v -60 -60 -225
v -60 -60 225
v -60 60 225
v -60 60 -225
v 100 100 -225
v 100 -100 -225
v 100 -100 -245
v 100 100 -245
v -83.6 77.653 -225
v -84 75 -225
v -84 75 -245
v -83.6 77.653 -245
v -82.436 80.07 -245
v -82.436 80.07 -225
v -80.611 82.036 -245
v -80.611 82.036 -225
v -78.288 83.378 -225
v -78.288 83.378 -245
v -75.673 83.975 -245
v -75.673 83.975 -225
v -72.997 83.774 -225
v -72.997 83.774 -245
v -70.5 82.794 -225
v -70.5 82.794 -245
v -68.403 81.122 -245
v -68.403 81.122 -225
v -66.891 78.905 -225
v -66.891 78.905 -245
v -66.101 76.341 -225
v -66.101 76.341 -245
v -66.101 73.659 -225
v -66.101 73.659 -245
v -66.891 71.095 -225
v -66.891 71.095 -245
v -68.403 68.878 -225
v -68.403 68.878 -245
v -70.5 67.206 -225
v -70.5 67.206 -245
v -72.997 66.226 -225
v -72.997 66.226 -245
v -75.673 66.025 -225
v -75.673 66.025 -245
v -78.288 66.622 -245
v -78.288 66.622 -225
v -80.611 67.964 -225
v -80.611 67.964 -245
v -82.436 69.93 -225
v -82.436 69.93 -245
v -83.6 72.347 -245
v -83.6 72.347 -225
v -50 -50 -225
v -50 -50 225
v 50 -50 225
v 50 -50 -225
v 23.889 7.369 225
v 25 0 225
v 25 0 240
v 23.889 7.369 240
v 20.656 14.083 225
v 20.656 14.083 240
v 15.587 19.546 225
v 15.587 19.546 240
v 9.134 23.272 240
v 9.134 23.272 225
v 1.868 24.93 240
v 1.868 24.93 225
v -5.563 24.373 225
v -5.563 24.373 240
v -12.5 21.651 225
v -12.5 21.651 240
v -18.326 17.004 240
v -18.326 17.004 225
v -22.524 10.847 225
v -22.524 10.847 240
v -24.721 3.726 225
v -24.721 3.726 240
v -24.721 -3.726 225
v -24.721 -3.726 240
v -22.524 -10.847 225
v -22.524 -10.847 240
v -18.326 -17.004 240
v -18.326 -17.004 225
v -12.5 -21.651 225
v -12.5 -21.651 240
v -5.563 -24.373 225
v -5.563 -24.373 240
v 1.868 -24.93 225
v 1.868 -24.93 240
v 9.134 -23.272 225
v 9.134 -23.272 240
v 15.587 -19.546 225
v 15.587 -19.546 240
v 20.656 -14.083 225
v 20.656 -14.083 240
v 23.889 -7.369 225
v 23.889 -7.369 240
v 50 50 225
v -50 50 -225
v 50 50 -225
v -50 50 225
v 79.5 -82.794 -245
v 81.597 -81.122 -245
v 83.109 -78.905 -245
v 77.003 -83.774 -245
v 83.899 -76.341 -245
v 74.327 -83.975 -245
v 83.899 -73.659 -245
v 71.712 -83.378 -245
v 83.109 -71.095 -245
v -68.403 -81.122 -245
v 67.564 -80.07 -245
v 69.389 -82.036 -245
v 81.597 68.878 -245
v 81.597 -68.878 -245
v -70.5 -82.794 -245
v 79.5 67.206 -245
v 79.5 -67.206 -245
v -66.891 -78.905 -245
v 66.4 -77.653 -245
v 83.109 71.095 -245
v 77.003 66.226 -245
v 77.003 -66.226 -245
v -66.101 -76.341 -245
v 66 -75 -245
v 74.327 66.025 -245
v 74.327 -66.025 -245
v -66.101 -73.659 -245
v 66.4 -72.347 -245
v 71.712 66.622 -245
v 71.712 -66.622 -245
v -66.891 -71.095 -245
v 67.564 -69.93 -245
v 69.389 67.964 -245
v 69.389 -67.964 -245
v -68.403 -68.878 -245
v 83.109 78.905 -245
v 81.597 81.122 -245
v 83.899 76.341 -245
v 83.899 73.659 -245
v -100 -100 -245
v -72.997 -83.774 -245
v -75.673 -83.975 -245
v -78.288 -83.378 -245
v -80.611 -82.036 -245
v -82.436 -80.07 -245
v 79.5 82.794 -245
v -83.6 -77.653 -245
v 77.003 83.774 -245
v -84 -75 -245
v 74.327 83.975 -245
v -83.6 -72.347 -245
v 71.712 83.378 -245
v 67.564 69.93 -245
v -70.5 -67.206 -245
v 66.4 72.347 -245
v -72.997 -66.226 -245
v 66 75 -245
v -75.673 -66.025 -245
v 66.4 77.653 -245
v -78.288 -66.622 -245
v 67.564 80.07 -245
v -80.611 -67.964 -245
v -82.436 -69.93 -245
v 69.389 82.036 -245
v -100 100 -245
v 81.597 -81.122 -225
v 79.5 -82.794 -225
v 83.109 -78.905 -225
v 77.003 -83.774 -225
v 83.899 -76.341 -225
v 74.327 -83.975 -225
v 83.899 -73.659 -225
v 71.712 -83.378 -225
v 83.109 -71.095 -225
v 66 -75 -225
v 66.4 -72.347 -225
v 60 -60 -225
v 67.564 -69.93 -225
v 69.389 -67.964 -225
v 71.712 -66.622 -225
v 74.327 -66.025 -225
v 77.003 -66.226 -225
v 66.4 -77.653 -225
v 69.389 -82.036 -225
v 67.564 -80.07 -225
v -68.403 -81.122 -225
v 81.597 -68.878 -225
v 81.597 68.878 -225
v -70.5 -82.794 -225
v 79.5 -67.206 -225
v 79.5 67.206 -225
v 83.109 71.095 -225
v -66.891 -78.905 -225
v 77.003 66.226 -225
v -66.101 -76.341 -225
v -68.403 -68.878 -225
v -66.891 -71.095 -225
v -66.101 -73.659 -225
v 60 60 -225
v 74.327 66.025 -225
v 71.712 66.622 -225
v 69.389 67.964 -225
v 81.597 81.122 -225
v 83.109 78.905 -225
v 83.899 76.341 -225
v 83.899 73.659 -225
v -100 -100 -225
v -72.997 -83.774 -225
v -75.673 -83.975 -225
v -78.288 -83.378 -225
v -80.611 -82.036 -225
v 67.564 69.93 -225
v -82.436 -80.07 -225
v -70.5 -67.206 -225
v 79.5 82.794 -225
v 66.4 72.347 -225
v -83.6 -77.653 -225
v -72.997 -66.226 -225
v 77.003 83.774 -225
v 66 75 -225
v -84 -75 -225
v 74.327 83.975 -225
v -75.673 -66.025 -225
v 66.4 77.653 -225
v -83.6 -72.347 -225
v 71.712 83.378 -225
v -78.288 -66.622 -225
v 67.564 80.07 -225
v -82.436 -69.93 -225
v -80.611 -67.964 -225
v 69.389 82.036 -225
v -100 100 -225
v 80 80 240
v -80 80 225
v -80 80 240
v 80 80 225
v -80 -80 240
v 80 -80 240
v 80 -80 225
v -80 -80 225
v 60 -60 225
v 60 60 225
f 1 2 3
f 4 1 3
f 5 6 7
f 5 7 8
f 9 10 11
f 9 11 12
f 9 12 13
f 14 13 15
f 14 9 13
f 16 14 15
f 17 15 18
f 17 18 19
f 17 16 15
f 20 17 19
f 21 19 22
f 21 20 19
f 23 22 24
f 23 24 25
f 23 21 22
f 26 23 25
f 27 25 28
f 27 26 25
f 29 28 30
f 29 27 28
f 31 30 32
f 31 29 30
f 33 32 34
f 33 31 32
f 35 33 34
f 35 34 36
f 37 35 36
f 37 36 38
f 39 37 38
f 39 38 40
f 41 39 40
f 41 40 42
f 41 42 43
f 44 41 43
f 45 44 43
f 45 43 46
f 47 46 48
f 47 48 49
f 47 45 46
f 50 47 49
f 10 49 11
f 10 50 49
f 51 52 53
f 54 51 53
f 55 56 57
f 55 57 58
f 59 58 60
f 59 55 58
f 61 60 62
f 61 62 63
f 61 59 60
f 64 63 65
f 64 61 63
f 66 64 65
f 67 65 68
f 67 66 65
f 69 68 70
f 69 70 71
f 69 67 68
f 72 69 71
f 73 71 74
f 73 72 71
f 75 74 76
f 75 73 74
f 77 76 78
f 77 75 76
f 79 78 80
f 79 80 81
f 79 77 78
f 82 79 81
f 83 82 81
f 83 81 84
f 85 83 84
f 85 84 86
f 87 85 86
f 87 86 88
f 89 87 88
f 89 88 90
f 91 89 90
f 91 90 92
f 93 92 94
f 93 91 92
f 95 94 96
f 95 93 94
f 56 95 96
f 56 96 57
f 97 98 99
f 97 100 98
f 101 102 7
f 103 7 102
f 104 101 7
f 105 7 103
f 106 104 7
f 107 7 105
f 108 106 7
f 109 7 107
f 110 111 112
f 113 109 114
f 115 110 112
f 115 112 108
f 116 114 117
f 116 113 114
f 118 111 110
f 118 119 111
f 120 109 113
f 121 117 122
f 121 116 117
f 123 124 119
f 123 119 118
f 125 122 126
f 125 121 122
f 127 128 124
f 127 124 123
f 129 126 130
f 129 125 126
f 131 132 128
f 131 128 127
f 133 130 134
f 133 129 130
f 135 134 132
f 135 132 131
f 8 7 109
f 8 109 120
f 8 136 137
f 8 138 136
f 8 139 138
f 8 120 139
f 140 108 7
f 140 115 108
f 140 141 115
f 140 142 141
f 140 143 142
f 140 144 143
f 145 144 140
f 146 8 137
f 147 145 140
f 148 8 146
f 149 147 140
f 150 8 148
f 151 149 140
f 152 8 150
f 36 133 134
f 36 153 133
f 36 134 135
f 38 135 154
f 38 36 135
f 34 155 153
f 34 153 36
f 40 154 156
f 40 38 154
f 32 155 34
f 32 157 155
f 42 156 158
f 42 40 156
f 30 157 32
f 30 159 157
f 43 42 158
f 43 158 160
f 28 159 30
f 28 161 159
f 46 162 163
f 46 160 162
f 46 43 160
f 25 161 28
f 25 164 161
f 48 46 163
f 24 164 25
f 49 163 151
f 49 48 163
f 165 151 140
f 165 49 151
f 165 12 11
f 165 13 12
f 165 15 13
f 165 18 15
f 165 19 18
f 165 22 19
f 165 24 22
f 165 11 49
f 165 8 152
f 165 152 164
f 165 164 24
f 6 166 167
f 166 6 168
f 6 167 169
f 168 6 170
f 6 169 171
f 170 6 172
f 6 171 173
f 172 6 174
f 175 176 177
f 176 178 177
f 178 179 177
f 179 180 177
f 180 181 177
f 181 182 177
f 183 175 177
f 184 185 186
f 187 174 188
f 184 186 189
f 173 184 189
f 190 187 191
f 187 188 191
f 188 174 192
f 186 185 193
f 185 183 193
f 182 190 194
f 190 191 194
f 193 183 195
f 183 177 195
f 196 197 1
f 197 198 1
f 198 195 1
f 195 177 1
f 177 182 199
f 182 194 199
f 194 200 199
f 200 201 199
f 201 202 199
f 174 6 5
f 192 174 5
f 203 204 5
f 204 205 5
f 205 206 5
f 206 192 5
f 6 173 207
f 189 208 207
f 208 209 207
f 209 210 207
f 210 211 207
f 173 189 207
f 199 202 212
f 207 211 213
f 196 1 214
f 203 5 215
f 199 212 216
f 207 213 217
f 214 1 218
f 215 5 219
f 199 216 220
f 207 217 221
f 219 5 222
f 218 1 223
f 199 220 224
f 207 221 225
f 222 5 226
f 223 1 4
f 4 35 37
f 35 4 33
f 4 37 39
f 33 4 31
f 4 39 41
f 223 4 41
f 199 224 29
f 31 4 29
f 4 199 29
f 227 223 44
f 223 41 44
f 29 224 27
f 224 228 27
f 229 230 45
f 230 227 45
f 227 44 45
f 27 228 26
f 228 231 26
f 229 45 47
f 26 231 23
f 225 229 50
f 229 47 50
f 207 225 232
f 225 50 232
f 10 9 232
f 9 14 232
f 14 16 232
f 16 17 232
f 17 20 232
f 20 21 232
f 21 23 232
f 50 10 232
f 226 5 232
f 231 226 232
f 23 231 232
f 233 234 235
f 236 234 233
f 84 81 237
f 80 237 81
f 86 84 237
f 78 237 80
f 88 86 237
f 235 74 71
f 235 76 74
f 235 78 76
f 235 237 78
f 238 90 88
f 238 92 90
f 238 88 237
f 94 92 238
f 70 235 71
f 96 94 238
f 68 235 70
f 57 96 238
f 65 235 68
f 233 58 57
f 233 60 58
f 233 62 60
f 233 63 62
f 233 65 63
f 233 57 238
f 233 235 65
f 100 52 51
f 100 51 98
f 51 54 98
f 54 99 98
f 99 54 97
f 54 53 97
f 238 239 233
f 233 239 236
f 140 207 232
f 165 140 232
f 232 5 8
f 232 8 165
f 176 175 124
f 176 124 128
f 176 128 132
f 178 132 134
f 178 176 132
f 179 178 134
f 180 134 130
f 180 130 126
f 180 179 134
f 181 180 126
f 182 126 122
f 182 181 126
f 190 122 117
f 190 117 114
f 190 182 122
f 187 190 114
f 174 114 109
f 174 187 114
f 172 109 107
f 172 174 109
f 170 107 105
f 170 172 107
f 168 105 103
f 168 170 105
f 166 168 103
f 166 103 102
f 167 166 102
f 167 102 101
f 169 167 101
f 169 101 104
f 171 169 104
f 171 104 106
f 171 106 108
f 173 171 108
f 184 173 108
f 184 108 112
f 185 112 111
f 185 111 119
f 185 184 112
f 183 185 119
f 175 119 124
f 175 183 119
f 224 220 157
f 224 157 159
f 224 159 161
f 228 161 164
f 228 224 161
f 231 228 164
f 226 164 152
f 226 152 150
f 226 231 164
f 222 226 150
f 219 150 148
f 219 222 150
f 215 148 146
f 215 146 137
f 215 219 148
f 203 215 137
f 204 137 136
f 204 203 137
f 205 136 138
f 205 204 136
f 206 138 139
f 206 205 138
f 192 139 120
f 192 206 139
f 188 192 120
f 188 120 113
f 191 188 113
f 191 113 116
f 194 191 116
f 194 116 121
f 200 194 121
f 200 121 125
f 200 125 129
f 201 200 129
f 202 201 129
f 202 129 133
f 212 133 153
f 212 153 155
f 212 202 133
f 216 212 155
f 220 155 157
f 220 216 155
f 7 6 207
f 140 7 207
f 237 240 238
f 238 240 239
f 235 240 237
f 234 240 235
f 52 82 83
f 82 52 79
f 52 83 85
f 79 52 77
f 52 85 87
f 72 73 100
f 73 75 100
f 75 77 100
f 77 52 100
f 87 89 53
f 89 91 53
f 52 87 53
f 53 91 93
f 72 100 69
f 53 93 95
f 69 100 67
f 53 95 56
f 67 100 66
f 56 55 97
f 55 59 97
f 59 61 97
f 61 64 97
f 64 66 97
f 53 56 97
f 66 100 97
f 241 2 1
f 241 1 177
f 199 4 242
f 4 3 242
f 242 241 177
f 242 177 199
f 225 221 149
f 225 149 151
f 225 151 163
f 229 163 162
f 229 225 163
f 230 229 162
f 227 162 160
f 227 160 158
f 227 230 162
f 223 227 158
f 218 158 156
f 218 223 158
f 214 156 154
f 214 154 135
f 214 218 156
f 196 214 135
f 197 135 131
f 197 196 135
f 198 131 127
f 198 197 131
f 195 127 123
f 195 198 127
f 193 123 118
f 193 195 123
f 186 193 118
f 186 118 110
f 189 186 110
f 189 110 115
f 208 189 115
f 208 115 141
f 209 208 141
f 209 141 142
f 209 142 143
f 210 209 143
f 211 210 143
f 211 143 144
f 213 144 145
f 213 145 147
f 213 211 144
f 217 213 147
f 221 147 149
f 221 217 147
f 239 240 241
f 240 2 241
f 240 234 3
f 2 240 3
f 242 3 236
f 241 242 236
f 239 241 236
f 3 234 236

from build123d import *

# Parameters (mm, degrees)
SKETCH_8_W      = 120
SKETCH_8_H      = 120
SKETCH_8_W_2    = 100
SKETCH_8_H_2    = 100
EXTRUDE_1_DEPTH = 225
SKETCH_9_W      = 160
SKETCH_9_H      = 160
SKETCH_9_R      = 25
EXTRUDE_2_DEPTH = 15
SKETCH_10_W     = 200
SKETCH_10_H     = 200
SKETCH_10_R     = 9
EXTRUDE_3_DEPTH = 20


with BuildPart() as part:
    # 草图8 → 凸台-拉伸1 (new, symmetric)
    with BuildSketch(Plane.XY):
        Rectangle(SKETCH_8_W, SKETCH_8_H)
        Rectangle(SKETCH_8_W_2, SKETCH_8_H_2, mode=Mode.SUBTRACT)
    extrude(amount=EXTRUDE_1_DEPTH, both=True)

    # 草图9 → 凸台-拉伸2 (add)
    with BuildSketch(Plane.XY.offset(225)):
        Rectangle(SKETCH_9_W, SKETCH_9_H)
        Circle(SKETCH_9_R, mode=Mode.SUBTRACT)
    extrude(amount=EXTRUDE_2_DEPTH)

    # 草图10 → 凸台-拉伸3 (add)
    with BuildSketch(Plane(origin=(0, 0, -225), x_dir=(-1, 0, 0), z_dir=(0, 0, -1))):
        Rectangle(SKETCH_10_W, SKETCH_10_H)
        with Locations((75, 75)):
            Circle(SKETCH_10_R, mode=Mode.SUBTRACT)
        with Locations((-75, 75)):
            Circle(SKETCH_10_R, mode=Mode.SUBTRACT)
        with Locations((75, -75)):
            Circle(SKETCH_10_R, mode=Mode.SUBTRACT)
        with Locations((-75, -75)):
            Circle(SKETCH_10_R, mode=Mode.SUBTRACT)
    extrude(amount=EXTRUDE_3_DEPTH)


solid = part.part
